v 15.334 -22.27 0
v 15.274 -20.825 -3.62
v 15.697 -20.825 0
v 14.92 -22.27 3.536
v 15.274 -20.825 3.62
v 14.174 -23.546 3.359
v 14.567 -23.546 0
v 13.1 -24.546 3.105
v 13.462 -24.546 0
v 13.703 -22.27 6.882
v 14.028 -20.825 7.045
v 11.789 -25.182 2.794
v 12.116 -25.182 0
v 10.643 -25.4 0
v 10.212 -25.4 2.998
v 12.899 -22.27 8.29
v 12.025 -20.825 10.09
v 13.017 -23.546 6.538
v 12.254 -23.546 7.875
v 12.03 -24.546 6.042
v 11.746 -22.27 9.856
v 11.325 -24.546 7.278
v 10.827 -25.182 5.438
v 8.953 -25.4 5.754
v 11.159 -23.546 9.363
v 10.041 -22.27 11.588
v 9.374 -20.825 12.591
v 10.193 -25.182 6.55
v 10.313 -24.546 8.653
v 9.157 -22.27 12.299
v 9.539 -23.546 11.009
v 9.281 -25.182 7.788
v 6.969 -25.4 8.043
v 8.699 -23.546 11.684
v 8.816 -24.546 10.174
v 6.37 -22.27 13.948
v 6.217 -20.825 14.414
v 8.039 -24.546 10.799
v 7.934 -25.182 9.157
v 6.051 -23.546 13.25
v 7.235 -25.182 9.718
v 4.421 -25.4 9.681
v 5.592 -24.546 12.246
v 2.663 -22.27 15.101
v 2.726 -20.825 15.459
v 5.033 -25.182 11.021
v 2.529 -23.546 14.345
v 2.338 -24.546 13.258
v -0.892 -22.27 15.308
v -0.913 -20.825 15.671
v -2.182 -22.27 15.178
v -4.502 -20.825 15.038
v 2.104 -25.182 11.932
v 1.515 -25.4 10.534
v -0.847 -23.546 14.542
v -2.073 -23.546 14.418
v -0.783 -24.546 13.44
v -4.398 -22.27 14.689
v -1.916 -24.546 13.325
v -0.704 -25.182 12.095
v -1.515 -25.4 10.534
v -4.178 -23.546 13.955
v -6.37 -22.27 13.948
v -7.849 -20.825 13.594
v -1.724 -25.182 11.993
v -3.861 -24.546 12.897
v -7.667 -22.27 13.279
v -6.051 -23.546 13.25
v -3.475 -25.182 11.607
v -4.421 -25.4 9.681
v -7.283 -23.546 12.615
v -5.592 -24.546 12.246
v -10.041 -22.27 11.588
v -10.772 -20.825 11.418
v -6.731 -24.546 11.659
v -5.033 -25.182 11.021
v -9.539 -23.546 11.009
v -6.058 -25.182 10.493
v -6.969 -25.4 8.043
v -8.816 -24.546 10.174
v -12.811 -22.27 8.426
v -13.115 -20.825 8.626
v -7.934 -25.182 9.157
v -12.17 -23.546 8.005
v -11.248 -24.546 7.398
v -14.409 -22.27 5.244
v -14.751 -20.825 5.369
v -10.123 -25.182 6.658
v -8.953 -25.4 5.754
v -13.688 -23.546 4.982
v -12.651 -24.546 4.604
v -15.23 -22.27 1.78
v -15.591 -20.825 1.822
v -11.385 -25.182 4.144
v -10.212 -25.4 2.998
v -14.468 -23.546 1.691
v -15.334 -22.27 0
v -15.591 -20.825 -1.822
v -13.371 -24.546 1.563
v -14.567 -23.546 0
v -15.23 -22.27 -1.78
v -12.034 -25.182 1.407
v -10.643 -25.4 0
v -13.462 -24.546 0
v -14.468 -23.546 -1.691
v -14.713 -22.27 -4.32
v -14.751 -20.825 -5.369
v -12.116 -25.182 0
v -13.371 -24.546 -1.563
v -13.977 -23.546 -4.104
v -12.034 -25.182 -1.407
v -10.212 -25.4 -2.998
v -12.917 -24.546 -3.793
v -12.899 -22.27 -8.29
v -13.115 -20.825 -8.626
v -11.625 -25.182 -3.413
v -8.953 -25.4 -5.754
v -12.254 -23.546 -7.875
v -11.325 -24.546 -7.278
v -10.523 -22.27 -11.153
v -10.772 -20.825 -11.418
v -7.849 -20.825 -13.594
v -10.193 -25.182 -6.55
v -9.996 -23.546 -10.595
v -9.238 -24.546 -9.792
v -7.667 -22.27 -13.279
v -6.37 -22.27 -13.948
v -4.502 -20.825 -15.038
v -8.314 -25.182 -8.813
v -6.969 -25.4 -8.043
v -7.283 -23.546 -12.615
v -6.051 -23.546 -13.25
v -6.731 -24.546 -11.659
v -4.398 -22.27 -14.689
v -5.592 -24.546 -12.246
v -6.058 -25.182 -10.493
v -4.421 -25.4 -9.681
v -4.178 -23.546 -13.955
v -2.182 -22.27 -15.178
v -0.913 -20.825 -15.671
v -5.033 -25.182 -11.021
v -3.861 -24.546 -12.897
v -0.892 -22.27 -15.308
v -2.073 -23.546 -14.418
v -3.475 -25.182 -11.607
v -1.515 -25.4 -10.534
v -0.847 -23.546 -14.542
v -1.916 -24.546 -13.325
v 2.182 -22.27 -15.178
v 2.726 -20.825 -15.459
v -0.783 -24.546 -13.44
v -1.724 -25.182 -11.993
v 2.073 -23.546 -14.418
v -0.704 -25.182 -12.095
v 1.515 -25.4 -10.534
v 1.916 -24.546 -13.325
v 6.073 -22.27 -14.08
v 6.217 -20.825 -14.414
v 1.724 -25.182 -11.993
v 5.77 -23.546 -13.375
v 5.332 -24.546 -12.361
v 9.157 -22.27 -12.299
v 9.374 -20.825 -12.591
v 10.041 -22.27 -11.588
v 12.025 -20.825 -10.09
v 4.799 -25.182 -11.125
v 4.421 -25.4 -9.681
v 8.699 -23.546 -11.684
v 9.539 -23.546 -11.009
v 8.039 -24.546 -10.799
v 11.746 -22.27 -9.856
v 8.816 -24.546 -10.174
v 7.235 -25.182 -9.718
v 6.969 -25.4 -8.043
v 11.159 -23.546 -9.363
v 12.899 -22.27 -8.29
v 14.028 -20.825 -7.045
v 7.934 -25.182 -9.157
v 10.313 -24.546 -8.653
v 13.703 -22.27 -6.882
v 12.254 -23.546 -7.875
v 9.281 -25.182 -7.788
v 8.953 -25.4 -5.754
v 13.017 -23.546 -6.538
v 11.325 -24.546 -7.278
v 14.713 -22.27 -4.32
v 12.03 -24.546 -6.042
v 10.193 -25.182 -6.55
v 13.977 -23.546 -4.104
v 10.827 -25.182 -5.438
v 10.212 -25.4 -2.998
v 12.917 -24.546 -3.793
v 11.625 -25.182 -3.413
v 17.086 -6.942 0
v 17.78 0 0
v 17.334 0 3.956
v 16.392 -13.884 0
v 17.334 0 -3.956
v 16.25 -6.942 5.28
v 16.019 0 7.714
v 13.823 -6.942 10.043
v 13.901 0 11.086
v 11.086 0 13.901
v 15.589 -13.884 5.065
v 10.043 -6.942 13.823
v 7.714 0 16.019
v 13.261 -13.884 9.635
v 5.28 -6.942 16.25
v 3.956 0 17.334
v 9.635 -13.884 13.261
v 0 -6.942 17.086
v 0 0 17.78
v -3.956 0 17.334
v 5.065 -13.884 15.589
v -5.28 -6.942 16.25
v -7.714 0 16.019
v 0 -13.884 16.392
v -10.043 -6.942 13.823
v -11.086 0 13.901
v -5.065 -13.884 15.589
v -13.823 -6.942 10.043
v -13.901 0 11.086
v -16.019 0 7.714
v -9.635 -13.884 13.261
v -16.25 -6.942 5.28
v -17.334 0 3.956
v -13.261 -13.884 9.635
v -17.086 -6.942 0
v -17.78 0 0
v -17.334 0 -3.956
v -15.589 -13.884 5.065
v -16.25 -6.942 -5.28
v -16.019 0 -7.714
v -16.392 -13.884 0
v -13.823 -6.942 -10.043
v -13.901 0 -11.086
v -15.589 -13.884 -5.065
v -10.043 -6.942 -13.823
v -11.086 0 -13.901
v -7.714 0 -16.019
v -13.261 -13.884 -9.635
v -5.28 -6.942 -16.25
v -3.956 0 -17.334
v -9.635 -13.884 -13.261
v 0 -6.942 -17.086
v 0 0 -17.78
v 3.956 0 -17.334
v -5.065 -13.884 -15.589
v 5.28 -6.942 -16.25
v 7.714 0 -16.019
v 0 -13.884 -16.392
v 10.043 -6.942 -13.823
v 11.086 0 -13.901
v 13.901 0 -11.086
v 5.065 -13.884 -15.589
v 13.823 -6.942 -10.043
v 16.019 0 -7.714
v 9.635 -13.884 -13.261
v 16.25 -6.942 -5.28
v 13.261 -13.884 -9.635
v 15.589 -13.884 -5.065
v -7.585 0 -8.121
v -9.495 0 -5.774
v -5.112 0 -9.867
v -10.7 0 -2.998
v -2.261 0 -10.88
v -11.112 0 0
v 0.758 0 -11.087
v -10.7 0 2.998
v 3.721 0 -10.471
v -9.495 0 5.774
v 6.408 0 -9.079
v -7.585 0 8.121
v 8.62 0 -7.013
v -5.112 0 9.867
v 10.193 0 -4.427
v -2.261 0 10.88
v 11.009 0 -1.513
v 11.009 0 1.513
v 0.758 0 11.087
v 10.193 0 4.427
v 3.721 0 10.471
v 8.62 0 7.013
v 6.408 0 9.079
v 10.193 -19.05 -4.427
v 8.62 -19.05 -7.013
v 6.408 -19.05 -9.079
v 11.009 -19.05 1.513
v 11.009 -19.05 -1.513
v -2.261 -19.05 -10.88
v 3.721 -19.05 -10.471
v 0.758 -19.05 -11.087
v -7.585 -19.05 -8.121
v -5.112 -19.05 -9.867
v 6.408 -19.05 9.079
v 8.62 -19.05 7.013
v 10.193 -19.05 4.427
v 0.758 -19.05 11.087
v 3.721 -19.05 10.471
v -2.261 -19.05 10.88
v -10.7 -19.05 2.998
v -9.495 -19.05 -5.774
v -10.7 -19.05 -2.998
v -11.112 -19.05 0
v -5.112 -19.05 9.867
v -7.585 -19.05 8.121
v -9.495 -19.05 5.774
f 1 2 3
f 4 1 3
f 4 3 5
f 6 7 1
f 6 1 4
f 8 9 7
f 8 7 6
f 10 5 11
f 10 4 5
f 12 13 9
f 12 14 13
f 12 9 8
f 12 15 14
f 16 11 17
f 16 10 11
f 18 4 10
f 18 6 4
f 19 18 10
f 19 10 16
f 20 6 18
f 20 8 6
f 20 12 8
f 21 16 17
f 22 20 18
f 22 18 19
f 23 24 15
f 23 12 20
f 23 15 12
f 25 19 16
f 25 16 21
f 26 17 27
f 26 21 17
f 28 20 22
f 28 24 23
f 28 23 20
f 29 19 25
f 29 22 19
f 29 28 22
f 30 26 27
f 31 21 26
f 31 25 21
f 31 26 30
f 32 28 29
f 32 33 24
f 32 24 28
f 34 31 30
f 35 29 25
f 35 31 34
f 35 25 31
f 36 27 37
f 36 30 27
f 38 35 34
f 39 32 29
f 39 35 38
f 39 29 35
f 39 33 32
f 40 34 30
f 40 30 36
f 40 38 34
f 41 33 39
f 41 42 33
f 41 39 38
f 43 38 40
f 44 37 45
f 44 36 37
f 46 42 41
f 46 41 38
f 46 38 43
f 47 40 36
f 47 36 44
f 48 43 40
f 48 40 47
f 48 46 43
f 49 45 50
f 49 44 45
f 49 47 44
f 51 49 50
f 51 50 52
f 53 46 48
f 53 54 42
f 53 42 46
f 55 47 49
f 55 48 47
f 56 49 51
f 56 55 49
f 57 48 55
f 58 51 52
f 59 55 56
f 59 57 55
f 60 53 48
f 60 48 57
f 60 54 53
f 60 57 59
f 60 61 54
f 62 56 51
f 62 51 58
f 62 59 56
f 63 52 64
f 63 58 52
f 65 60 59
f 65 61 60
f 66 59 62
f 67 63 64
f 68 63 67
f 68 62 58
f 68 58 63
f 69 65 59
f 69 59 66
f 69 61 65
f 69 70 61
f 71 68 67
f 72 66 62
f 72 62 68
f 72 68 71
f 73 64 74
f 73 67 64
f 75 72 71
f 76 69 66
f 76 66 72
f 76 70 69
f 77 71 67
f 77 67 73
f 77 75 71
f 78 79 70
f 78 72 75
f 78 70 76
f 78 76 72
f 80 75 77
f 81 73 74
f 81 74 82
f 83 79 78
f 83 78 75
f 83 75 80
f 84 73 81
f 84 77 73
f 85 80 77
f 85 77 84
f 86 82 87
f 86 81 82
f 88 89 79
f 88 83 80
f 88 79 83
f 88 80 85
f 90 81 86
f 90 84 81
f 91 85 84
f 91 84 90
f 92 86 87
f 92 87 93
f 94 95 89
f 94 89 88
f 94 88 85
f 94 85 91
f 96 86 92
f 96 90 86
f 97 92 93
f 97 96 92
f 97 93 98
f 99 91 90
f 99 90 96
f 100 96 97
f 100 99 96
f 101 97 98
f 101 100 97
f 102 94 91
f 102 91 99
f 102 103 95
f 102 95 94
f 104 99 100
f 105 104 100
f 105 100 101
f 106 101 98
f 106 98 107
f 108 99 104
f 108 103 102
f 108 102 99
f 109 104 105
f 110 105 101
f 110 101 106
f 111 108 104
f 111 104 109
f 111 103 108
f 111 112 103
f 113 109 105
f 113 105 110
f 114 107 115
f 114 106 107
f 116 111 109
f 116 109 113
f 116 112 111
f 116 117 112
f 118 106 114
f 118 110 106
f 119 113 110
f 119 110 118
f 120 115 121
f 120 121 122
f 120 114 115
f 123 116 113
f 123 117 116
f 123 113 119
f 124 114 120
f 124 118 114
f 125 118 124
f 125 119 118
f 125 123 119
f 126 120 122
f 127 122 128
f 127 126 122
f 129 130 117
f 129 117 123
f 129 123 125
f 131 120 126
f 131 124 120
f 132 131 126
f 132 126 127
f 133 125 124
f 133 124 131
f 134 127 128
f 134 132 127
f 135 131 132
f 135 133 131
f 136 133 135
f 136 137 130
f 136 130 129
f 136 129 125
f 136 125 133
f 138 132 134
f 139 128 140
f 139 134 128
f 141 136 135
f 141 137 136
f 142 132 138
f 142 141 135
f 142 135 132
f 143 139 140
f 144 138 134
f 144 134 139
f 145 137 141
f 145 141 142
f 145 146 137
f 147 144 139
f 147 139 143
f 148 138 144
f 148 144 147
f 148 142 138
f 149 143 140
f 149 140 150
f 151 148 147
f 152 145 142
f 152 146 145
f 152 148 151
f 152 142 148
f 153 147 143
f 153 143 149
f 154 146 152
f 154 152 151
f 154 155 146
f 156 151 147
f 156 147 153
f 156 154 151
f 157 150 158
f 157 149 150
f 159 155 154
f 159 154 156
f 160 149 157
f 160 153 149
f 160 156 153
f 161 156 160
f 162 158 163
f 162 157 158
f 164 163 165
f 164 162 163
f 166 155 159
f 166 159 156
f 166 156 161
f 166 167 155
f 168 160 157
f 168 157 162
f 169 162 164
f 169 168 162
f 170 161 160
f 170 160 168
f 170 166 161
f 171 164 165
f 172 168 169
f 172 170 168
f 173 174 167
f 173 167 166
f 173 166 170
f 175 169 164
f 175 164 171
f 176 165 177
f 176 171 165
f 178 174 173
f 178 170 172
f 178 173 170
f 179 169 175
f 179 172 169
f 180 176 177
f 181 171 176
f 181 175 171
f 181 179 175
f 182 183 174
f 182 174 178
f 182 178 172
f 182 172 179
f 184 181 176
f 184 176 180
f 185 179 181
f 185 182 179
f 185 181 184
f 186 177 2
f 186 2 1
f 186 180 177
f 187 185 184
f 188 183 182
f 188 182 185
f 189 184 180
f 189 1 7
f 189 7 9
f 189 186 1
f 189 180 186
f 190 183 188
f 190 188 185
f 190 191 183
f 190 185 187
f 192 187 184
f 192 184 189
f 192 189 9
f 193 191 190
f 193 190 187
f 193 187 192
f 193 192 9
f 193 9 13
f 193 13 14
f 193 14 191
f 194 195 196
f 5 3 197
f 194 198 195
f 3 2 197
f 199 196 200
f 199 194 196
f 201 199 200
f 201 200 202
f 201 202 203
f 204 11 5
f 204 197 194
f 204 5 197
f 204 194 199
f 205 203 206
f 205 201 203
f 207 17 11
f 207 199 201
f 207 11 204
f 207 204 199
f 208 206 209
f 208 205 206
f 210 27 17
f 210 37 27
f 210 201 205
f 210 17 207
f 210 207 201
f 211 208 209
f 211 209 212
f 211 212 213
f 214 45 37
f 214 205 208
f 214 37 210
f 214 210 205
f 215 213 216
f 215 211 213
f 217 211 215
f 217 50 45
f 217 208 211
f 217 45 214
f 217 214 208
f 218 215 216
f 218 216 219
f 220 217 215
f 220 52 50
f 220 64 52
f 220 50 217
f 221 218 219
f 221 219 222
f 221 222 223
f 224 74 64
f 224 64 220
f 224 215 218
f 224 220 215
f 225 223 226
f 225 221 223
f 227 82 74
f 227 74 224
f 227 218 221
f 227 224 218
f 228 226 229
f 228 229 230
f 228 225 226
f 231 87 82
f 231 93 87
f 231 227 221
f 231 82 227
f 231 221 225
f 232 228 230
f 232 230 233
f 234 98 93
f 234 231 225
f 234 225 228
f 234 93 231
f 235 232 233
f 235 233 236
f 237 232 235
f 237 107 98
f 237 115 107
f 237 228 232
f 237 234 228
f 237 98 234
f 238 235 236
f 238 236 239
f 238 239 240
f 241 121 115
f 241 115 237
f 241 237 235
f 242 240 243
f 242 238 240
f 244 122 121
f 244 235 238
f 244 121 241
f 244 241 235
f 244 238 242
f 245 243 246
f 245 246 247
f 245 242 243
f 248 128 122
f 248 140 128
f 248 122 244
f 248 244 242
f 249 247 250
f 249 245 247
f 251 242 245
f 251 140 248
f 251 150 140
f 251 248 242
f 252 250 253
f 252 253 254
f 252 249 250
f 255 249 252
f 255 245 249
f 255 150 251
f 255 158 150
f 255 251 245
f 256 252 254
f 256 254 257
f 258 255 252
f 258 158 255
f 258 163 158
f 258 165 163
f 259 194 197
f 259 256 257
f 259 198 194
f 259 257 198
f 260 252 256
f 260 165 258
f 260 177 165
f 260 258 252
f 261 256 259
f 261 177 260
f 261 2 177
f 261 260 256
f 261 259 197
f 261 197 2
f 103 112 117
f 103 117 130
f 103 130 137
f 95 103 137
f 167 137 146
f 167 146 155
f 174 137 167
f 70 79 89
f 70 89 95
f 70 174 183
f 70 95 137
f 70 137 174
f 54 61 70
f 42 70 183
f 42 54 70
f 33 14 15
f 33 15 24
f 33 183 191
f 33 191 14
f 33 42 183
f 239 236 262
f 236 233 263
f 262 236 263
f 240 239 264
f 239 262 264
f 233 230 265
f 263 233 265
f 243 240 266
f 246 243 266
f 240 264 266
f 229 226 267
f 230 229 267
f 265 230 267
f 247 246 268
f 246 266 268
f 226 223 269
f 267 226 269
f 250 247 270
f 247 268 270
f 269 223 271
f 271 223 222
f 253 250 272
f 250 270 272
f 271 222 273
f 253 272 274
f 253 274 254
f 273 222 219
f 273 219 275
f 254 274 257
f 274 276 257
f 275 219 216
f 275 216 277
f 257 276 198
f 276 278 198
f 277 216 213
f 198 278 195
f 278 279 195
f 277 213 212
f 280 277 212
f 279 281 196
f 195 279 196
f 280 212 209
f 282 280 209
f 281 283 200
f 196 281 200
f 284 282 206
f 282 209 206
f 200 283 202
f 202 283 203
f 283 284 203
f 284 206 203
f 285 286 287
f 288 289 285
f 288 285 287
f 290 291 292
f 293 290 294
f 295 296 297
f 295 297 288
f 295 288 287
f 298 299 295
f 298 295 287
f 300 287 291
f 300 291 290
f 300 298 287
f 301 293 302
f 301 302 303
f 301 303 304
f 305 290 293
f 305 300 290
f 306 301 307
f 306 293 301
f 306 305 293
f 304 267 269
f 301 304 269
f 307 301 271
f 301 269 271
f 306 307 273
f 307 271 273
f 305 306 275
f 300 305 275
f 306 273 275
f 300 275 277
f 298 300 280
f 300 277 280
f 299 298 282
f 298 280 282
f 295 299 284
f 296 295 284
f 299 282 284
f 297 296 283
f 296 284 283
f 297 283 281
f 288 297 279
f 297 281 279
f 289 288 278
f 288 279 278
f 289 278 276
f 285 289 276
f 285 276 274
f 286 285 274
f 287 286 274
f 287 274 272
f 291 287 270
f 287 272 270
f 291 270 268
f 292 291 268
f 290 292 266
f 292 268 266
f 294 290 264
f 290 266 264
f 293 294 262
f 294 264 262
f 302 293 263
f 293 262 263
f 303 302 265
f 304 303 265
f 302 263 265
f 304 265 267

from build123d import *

# Parameters (mm, degrees)
F0_R     = 17.78
F2_R     = 15.24
F4_R     = 5.08
F5_R     = 11.1125
F6_DEPTH = 19.05


with BuildPart() as f3:
    # F0 (on Front) → F3 section 0
    with BuildSketch(Plane.XZ):
        Circle(F0_R)
    # F2 (on offset) → F3 section 1
    with BuildSketch(Plane.XZ.offset(25.4)):
        Circle(F2_R)
    loft()

    # F4
    f4_edges = [f3.edges().sort_by_distance(p)[0] for p in [
        (-15.24, -25.4, 0),
    ]]
    fillet(f4_edges, radius=F4_R)

    # F5 (on face) → F6 (cut)
    with BuildSketch(Plane(origin=(0, 0, 0), x_dir=(-1, 0, 0), z_dir=(0, 1, 0))):
        Circle(F5_R)
    extrude(amount=-F6_DEPTH, mode=Mode.SUBTRACT)


solid = f3.part
